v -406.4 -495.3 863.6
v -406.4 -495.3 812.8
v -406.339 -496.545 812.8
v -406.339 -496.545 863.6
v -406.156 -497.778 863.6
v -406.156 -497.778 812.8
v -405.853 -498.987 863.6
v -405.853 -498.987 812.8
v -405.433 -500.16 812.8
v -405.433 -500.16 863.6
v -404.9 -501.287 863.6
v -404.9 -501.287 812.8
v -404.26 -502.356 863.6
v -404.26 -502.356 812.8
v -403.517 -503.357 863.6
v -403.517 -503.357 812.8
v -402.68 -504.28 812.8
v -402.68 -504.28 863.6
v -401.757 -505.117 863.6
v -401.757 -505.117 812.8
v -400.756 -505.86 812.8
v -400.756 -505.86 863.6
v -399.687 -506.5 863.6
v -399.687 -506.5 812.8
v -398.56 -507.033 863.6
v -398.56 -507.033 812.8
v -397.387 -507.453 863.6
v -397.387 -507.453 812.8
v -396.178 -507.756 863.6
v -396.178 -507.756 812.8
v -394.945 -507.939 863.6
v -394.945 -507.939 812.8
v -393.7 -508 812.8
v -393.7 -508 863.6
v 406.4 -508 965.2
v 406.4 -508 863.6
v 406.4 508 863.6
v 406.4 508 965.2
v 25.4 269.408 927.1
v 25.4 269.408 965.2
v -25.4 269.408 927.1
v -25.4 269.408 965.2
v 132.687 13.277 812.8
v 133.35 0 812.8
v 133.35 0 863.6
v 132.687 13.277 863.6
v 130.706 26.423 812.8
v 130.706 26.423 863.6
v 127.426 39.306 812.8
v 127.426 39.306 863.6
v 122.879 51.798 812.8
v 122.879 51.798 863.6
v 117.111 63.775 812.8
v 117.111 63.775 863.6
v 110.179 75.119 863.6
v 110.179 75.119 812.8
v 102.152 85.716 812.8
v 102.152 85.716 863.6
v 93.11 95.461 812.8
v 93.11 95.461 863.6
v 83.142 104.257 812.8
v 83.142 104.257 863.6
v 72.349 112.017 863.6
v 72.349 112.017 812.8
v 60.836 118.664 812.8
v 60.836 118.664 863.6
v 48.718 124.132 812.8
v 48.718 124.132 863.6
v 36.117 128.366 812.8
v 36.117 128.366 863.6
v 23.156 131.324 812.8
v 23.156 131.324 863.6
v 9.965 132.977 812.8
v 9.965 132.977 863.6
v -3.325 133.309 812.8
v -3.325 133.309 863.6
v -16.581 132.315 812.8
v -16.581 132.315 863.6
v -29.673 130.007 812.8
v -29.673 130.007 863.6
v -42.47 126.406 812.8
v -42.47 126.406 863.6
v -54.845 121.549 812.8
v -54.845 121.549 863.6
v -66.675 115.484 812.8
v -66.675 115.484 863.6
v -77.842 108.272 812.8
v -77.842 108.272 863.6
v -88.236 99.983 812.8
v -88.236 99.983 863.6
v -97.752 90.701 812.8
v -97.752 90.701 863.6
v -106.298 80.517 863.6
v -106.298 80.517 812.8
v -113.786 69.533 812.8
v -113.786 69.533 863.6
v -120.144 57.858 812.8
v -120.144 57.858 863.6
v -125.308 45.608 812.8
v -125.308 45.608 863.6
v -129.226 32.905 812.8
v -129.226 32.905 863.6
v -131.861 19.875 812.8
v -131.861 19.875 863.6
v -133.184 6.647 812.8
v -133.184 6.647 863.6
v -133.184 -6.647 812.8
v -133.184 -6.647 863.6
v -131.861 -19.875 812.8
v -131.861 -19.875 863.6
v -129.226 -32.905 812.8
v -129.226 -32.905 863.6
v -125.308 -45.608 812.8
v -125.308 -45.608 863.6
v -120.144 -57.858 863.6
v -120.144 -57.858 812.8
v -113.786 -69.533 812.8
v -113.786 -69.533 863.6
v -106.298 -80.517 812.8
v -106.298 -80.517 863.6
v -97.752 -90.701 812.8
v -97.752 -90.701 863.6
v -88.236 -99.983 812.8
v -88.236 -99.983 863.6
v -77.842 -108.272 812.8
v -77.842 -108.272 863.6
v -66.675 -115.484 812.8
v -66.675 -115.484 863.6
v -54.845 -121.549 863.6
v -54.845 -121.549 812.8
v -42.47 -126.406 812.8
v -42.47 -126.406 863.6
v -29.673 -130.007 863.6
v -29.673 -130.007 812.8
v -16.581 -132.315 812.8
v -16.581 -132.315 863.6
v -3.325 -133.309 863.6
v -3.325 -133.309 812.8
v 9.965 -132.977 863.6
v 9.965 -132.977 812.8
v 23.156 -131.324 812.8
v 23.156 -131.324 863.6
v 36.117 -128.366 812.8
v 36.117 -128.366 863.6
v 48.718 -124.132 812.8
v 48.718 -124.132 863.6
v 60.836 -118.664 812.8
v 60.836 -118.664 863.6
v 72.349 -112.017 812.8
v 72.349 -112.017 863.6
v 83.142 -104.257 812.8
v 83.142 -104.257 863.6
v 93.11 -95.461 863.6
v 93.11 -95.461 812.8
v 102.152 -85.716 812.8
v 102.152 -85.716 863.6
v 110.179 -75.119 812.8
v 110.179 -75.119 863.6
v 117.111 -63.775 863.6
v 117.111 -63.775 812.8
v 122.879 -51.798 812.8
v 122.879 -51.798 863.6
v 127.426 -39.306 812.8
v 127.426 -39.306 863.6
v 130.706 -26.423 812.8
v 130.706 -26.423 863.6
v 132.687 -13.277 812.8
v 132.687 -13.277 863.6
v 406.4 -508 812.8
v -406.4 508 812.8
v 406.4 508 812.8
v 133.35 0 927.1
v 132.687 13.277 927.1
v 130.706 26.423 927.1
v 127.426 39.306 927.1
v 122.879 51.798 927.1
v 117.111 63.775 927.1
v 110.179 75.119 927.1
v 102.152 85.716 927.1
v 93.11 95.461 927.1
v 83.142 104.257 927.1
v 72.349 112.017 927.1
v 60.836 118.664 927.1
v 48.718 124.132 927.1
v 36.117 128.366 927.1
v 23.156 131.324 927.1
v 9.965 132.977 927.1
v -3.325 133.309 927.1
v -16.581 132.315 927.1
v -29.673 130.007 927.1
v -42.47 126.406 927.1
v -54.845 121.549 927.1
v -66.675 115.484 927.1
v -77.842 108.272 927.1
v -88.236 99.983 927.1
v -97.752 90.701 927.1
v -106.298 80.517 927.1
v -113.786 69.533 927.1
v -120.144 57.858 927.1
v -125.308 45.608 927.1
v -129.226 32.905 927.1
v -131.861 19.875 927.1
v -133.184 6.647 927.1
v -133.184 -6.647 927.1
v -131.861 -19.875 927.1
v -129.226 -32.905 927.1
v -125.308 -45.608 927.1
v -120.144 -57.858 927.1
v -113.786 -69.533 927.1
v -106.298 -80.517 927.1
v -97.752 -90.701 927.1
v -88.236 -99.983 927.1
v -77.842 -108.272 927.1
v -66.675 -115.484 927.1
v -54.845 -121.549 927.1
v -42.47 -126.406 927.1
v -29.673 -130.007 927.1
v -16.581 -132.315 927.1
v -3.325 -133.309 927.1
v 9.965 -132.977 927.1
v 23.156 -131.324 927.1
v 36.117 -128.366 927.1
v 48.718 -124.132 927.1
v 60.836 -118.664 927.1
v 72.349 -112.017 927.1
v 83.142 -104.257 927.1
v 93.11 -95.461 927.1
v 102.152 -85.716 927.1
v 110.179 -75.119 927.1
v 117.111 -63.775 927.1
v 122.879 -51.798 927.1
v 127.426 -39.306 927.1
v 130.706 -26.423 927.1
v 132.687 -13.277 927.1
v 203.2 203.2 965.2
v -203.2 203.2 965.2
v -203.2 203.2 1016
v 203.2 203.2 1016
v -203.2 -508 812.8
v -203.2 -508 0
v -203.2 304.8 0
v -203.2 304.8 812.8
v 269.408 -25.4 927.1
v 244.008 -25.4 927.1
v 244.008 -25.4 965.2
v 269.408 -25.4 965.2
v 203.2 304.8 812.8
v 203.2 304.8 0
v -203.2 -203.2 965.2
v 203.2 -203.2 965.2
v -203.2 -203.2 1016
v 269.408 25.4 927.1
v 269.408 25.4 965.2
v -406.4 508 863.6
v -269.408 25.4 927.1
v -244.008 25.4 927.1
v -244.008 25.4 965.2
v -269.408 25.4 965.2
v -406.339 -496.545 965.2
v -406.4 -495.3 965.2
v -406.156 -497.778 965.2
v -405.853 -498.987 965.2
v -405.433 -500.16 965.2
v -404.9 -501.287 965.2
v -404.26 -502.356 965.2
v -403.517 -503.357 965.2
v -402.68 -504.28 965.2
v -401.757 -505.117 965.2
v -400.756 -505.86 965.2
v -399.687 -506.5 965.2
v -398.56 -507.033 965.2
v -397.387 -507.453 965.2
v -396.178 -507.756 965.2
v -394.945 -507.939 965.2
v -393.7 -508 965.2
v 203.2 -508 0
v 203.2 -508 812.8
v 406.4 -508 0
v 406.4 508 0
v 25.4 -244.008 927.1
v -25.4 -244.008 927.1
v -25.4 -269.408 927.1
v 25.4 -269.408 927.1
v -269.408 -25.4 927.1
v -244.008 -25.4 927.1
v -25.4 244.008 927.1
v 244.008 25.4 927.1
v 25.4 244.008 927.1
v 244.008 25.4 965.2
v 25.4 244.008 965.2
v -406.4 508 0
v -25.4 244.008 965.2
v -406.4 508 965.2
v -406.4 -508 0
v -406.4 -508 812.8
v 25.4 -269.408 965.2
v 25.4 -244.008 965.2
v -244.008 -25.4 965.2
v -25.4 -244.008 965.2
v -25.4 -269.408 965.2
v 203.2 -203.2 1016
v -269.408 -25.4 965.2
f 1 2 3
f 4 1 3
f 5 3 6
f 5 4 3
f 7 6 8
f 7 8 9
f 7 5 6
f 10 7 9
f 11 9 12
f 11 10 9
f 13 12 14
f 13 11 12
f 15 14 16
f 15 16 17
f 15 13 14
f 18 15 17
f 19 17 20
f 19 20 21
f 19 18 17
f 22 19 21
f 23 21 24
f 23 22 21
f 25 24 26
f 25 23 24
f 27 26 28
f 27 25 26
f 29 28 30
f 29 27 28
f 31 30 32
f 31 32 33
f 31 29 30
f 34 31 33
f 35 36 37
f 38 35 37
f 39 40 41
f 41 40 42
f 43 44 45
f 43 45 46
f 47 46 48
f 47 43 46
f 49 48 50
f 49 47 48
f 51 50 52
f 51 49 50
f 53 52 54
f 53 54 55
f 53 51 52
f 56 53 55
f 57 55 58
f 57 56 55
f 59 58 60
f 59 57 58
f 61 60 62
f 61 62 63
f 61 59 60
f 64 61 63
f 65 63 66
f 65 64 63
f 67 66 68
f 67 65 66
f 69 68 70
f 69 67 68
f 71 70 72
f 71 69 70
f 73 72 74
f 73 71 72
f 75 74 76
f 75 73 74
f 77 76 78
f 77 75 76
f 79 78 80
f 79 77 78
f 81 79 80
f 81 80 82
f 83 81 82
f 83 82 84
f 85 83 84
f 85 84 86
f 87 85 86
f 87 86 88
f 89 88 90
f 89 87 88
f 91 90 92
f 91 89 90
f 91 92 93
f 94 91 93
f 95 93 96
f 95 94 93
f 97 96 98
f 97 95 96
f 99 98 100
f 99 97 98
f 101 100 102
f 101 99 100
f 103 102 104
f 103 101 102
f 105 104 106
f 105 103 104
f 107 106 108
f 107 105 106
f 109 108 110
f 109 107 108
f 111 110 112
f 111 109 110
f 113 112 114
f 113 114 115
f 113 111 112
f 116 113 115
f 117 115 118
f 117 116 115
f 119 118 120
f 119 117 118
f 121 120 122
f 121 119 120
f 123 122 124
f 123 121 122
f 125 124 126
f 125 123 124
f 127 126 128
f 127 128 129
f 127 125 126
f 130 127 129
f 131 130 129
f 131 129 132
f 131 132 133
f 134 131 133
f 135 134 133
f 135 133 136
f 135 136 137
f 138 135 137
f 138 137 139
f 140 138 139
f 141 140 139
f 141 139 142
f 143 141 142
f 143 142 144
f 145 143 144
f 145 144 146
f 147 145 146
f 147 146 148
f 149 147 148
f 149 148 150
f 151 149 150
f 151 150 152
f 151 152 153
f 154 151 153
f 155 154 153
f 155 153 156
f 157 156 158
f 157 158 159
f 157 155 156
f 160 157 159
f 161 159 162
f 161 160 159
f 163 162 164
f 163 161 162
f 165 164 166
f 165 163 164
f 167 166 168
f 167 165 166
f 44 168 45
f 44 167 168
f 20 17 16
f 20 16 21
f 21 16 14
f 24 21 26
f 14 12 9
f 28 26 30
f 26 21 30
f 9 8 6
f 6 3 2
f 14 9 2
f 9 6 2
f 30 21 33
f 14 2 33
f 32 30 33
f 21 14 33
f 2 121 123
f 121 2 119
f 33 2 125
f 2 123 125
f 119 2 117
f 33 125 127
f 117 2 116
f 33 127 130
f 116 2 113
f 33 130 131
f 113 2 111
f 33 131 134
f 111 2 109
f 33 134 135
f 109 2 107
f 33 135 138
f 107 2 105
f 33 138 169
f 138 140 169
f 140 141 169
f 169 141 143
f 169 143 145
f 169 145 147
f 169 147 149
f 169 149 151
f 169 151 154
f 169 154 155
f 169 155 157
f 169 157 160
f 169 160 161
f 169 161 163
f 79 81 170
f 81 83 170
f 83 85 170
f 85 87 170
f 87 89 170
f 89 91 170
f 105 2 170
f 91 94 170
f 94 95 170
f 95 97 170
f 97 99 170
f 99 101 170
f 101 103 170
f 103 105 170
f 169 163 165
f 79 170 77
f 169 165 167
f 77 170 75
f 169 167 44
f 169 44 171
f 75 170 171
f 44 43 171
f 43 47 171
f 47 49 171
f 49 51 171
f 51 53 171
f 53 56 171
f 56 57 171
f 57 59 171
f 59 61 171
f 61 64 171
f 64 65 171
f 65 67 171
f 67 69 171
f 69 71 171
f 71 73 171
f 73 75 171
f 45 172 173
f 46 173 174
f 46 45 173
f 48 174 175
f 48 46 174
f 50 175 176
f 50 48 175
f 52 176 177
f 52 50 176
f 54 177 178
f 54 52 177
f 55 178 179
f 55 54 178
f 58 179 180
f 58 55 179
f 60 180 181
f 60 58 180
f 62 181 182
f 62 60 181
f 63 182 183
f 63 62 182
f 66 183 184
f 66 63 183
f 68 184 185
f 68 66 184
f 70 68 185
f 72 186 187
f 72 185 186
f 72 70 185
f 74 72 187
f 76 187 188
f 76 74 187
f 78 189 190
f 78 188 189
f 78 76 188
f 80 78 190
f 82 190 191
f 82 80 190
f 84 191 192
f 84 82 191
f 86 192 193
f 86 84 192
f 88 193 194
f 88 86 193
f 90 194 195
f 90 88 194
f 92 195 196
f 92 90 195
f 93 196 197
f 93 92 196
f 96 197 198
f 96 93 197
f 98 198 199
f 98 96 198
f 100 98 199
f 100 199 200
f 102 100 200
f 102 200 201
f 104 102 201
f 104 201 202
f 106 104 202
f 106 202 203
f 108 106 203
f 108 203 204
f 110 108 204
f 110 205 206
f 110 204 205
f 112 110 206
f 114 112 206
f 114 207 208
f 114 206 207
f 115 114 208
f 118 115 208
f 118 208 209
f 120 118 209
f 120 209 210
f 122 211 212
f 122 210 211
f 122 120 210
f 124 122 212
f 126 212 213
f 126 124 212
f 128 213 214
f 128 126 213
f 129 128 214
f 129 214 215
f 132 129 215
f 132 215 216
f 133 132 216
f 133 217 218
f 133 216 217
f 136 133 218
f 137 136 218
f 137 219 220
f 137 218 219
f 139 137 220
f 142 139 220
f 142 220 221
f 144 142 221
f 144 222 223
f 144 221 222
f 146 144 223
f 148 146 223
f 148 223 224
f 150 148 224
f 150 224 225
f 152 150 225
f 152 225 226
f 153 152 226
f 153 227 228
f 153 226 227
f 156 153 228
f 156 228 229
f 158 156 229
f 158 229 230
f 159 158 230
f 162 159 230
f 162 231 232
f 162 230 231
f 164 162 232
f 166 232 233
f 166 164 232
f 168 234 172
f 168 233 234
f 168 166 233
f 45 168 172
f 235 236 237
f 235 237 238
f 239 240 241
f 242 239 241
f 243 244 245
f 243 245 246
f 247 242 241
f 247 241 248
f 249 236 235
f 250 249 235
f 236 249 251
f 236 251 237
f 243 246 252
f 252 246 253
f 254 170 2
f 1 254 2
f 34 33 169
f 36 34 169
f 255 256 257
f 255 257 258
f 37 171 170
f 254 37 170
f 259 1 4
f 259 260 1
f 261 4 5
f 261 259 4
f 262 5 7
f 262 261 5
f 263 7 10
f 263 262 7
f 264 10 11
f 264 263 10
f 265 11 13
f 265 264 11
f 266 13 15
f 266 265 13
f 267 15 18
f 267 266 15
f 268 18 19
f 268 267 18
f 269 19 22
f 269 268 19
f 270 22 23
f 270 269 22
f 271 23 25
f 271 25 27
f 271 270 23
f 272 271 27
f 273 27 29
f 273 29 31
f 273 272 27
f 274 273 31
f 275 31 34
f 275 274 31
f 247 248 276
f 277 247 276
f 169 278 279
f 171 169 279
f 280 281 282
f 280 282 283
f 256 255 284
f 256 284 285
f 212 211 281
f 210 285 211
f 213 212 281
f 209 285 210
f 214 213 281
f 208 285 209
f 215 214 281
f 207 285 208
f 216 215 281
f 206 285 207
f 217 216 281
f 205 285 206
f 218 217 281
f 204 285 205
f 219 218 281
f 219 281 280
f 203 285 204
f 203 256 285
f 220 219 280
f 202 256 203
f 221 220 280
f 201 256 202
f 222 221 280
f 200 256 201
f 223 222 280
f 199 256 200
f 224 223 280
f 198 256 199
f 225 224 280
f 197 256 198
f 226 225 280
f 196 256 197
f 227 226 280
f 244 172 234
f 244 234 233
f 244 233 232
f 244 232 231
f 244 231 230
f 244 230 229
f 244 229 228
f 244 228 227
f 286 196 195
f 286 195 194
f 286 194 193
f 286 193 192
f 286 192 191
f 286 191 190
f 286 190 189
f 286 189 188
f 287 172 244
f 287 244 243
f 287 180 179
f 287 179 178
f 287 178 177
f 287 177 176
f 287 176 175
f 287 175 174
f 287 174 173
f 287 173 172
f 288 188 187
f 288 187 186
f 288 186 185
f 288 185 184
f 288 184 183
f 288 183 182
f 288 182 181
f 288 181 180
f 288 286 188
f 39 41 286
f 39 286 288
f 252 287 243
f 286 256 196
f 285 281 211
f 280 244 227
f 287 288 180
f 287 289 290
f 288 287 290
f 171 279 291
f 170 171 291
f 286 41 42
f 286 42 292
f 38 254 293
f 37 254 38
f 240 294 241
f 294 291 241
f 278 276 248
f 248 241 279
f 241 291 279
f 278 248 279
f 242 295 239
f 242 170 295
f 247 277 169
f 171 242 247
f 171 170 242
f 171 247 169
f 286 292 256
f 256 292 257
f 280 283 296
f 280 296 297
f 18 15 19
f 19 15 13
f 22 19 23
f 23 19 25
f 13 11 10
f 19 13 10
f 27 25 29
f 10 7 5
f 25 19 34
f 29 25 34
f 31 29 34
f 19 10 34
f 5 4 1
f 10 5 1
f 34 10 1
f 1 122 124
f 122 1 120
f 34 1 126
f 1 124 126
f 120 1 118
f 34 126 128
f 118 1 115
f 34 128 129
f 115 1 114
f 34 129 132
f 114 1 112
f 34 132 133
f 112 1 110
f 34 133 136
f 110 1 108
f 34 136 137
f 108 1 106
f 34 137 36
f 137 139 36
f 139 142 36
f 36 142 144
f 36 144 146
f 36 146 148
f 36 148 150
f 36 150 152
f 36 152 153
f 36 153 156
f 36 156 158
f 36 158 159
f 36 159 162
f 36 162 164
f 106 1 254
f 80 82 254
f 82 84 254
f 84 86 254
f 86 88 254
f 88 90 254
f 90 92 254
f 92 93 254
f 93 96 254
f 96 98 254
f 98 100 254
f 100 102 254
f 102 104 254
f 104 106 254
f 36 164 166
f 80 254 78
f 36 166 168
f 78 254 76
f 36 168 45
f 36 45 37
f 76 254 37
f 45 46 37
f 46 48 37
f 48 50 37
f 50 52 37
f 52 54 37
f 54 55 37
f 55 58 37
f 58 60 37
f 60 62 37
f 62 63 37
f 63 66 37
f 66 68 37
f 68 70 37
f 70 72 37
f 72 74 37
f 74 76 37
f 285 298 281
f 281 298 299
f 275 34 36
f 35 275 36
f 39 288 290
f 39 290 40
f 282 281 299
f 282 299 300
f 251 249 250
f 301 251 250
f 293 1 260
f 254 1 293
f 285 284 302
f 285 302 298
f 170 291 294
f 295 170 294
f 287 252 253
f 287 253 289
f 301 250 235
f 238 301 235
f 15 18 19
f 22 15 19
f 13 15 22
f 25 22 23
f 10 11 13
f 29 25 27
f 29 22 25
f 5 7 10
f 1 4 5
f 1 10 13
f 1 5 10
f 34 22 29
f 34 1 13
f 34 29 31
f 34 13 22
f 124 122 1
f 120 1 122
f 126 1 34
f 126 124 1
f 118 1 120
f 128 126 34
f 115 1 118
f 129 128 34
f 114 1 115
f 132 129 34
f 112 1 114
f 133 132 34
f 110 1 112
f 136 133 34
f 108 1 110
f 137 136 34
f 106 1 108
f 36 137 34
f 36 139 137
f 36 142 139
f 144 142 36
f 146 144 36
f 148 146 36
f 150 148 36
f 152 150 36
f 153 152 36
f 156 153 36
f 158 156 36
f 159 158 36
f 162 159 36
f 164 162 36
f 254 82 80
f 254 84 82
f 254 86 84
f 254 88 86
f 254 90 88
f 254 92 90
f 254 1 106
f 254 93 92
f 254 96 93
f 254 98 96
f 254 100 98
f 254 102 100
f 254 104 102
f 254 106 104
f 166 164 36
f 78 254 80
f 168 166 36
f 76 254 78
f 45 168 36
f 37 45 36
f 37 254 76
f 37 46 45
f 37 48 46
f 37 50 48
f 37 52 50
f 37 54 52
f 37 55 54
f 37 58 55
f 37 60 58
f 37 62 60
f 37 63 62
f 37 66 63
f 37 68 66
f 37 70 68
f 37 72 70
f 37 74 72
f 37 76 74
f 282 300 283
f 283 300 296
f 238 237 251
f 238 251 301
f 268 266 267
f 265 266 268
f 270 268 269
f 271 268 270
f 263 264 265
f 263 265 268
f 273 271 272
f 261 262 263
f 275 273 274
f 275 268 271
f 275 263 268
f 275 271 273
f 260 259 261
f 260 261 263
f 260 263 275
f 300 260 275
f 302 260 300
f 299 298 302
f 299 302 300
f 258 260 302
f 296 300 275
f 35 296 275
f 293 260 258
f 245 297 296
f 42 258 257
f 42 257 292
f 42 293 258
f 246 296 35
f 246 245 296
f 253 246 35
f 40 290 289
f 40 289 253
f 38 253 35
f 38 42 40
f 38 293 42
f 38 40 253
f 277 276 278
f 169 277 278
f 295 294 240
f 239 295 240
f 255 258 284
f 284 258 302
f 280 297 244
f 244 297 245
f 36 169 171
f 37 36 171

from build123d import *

# Parameters (mm, degrees)
F0_W     = 203.2
F0_H     = 406.4
F1_DEPTH = 812.8
F2_W     = 406.4
F2_H     = 812.8
F2_R     = 133.35
F3_DEPTH = 50.8
F4_W     = 812.8
F4_H     = 1016
F4_R     = 133.35
F5_DEPTH = 101.6
F6_W     = 406.4
F6_H     = 406.4
F6_R     = 133.35
F7_DEPTH = 50.8
F9_DEPTH = 38.1
F10_R    = 12.7
F11_R    = 12.7


with BuildPart() as f1:
    # F0 (on Top) → F1 (new body)
    with BuildSketch(Plane.XY):
        with Locations((-304.8, -304.8)):
            Rectangle(F0_W, F0_H)
        with Locations((-304.8, 101.6)):
            Rectangle(F0_W, F0_H)
        Polygon((0, 508), (-406.4, 508), (-406.4, 304.8), (-203.2, 304.8), (0, 304.8), align=None)
        Polygon((406.4, 508), (0, 508), (0, 304.8), (203.2, 304.8), (406.4, 304.8), align=None)
        with Locations((304.8, 101.6)):
            Rectangle(F0_W, F0_H)
        with Locations((304.8, -304.8)):
            Rectangle(F0_W, F0_H)
    extrude(amount=F1_DEPTH)


with BuildPart() as f3:
    # F2 (on face) → F3 (new body)
    with BuildSketch(Plane.XY.offset(812.8)):
        Polygon((406.4, 508), (-406.4, 508), (-406.4, -508), (-203.2, -508), (-203.2, 304.8), (203.2, 304.8), (203.2, -508), (406.4, -508), align=None)
        with Locations((0, -101.6)):
            Rectangle(F2_W, F2_H)
        Circle(F2_R, mode=Mode.SUBTRACT)
    extrude(amount=F3_DEPTH)

    # F10
    f10_edges = [f3.edges().sort_by_distance(p)[0] for p in [
        (-406.4, -508, 838.2),
    ]]
    fillet(f10_edges, radius=F10_R)


with BuildPart() as f5:
    # F4 (on face) → F5 (new body)
    with BuildSketch(Plane.XY.offset(863.6)):
        Rectangle(F4_W, F4_H)
        Circle(F4_R, mode=Mode.SUBTRACT)
    extrude(amount=F5_DEPTH)

    # F8 (on face) → F9 (cut)
    with BuildSketch(Plane.XY.offset(965.2)):
        Polygon((25.4, 269.4076836321), (0, 269.4076836321), (25.4, 244.0076836321), align=None)
        Polygon((25.4, 244.0076836321), (0, 269.4076836321), (-25.4, 244.0076836321), (-244.0076836321, 25.4), (-269.4076836321, 0), (-244.0076836321, -25.4), (-25.4, -244.0076836321), (0, -269.4076836321), (25.4, -244.0076836321), (244.0076836321, -25.4), (269.4076836321, 0), (244.0076836321, 25.4), align=None)
        Polygon((-25.4, 244.0076836321), (0, 269.4076836321), (-25.4, 269.4076836321), align=None)
        Polygon((269.4076836321, 25.4), (244.0076836321, 25.4), (269.4076836321, 0), align=None)
        Polygon((-269.4076836321, 0), (-244.0076836321, 25.4), (-269.4076836321, 25.4), align=None)
        Polygon((269.4076836321, -25.4), (269.4076836321, 0), (244.0076836321, -25.4), align=None)
        Polygon((-244.0076836321, -25.4), (-269.4076836321, 0), (-269.4076836321, -25.4), align=None)
        Polygon((25.4, -269.4076836321), (25.4, -244.0076836321), (0, -269.4076836321), align=None)
        Polygon((0, -269.4076836321), (-25.4, -244.0076836321), (-25.4, -269.4076836321), align=None)
    extrude(amount=-F9_DEPTH, mode=Mode.SUBTRACT)

    # F11
    f11_edges = [f5.edges().sort_by_distance(p)[0] for p in [
        (-406.4, -508, 914.4),
    ]]
    fillet(f11_edges, radius=F11_R)


with BuildPart() as f7:
    # F6 (on face) → F7 (new body)
    with BuildSketch(Plane.XY.offset(965.2)):
        Rectangle(F6_W, F6_H)
        Circle(F6_R, mode=Mode.SUBTRACT)
        Circle(F6_R)
    extrude(amount=F7_DEPTH)


solid = Compound([f1.part, f3.part, f5.part, f7.part])
